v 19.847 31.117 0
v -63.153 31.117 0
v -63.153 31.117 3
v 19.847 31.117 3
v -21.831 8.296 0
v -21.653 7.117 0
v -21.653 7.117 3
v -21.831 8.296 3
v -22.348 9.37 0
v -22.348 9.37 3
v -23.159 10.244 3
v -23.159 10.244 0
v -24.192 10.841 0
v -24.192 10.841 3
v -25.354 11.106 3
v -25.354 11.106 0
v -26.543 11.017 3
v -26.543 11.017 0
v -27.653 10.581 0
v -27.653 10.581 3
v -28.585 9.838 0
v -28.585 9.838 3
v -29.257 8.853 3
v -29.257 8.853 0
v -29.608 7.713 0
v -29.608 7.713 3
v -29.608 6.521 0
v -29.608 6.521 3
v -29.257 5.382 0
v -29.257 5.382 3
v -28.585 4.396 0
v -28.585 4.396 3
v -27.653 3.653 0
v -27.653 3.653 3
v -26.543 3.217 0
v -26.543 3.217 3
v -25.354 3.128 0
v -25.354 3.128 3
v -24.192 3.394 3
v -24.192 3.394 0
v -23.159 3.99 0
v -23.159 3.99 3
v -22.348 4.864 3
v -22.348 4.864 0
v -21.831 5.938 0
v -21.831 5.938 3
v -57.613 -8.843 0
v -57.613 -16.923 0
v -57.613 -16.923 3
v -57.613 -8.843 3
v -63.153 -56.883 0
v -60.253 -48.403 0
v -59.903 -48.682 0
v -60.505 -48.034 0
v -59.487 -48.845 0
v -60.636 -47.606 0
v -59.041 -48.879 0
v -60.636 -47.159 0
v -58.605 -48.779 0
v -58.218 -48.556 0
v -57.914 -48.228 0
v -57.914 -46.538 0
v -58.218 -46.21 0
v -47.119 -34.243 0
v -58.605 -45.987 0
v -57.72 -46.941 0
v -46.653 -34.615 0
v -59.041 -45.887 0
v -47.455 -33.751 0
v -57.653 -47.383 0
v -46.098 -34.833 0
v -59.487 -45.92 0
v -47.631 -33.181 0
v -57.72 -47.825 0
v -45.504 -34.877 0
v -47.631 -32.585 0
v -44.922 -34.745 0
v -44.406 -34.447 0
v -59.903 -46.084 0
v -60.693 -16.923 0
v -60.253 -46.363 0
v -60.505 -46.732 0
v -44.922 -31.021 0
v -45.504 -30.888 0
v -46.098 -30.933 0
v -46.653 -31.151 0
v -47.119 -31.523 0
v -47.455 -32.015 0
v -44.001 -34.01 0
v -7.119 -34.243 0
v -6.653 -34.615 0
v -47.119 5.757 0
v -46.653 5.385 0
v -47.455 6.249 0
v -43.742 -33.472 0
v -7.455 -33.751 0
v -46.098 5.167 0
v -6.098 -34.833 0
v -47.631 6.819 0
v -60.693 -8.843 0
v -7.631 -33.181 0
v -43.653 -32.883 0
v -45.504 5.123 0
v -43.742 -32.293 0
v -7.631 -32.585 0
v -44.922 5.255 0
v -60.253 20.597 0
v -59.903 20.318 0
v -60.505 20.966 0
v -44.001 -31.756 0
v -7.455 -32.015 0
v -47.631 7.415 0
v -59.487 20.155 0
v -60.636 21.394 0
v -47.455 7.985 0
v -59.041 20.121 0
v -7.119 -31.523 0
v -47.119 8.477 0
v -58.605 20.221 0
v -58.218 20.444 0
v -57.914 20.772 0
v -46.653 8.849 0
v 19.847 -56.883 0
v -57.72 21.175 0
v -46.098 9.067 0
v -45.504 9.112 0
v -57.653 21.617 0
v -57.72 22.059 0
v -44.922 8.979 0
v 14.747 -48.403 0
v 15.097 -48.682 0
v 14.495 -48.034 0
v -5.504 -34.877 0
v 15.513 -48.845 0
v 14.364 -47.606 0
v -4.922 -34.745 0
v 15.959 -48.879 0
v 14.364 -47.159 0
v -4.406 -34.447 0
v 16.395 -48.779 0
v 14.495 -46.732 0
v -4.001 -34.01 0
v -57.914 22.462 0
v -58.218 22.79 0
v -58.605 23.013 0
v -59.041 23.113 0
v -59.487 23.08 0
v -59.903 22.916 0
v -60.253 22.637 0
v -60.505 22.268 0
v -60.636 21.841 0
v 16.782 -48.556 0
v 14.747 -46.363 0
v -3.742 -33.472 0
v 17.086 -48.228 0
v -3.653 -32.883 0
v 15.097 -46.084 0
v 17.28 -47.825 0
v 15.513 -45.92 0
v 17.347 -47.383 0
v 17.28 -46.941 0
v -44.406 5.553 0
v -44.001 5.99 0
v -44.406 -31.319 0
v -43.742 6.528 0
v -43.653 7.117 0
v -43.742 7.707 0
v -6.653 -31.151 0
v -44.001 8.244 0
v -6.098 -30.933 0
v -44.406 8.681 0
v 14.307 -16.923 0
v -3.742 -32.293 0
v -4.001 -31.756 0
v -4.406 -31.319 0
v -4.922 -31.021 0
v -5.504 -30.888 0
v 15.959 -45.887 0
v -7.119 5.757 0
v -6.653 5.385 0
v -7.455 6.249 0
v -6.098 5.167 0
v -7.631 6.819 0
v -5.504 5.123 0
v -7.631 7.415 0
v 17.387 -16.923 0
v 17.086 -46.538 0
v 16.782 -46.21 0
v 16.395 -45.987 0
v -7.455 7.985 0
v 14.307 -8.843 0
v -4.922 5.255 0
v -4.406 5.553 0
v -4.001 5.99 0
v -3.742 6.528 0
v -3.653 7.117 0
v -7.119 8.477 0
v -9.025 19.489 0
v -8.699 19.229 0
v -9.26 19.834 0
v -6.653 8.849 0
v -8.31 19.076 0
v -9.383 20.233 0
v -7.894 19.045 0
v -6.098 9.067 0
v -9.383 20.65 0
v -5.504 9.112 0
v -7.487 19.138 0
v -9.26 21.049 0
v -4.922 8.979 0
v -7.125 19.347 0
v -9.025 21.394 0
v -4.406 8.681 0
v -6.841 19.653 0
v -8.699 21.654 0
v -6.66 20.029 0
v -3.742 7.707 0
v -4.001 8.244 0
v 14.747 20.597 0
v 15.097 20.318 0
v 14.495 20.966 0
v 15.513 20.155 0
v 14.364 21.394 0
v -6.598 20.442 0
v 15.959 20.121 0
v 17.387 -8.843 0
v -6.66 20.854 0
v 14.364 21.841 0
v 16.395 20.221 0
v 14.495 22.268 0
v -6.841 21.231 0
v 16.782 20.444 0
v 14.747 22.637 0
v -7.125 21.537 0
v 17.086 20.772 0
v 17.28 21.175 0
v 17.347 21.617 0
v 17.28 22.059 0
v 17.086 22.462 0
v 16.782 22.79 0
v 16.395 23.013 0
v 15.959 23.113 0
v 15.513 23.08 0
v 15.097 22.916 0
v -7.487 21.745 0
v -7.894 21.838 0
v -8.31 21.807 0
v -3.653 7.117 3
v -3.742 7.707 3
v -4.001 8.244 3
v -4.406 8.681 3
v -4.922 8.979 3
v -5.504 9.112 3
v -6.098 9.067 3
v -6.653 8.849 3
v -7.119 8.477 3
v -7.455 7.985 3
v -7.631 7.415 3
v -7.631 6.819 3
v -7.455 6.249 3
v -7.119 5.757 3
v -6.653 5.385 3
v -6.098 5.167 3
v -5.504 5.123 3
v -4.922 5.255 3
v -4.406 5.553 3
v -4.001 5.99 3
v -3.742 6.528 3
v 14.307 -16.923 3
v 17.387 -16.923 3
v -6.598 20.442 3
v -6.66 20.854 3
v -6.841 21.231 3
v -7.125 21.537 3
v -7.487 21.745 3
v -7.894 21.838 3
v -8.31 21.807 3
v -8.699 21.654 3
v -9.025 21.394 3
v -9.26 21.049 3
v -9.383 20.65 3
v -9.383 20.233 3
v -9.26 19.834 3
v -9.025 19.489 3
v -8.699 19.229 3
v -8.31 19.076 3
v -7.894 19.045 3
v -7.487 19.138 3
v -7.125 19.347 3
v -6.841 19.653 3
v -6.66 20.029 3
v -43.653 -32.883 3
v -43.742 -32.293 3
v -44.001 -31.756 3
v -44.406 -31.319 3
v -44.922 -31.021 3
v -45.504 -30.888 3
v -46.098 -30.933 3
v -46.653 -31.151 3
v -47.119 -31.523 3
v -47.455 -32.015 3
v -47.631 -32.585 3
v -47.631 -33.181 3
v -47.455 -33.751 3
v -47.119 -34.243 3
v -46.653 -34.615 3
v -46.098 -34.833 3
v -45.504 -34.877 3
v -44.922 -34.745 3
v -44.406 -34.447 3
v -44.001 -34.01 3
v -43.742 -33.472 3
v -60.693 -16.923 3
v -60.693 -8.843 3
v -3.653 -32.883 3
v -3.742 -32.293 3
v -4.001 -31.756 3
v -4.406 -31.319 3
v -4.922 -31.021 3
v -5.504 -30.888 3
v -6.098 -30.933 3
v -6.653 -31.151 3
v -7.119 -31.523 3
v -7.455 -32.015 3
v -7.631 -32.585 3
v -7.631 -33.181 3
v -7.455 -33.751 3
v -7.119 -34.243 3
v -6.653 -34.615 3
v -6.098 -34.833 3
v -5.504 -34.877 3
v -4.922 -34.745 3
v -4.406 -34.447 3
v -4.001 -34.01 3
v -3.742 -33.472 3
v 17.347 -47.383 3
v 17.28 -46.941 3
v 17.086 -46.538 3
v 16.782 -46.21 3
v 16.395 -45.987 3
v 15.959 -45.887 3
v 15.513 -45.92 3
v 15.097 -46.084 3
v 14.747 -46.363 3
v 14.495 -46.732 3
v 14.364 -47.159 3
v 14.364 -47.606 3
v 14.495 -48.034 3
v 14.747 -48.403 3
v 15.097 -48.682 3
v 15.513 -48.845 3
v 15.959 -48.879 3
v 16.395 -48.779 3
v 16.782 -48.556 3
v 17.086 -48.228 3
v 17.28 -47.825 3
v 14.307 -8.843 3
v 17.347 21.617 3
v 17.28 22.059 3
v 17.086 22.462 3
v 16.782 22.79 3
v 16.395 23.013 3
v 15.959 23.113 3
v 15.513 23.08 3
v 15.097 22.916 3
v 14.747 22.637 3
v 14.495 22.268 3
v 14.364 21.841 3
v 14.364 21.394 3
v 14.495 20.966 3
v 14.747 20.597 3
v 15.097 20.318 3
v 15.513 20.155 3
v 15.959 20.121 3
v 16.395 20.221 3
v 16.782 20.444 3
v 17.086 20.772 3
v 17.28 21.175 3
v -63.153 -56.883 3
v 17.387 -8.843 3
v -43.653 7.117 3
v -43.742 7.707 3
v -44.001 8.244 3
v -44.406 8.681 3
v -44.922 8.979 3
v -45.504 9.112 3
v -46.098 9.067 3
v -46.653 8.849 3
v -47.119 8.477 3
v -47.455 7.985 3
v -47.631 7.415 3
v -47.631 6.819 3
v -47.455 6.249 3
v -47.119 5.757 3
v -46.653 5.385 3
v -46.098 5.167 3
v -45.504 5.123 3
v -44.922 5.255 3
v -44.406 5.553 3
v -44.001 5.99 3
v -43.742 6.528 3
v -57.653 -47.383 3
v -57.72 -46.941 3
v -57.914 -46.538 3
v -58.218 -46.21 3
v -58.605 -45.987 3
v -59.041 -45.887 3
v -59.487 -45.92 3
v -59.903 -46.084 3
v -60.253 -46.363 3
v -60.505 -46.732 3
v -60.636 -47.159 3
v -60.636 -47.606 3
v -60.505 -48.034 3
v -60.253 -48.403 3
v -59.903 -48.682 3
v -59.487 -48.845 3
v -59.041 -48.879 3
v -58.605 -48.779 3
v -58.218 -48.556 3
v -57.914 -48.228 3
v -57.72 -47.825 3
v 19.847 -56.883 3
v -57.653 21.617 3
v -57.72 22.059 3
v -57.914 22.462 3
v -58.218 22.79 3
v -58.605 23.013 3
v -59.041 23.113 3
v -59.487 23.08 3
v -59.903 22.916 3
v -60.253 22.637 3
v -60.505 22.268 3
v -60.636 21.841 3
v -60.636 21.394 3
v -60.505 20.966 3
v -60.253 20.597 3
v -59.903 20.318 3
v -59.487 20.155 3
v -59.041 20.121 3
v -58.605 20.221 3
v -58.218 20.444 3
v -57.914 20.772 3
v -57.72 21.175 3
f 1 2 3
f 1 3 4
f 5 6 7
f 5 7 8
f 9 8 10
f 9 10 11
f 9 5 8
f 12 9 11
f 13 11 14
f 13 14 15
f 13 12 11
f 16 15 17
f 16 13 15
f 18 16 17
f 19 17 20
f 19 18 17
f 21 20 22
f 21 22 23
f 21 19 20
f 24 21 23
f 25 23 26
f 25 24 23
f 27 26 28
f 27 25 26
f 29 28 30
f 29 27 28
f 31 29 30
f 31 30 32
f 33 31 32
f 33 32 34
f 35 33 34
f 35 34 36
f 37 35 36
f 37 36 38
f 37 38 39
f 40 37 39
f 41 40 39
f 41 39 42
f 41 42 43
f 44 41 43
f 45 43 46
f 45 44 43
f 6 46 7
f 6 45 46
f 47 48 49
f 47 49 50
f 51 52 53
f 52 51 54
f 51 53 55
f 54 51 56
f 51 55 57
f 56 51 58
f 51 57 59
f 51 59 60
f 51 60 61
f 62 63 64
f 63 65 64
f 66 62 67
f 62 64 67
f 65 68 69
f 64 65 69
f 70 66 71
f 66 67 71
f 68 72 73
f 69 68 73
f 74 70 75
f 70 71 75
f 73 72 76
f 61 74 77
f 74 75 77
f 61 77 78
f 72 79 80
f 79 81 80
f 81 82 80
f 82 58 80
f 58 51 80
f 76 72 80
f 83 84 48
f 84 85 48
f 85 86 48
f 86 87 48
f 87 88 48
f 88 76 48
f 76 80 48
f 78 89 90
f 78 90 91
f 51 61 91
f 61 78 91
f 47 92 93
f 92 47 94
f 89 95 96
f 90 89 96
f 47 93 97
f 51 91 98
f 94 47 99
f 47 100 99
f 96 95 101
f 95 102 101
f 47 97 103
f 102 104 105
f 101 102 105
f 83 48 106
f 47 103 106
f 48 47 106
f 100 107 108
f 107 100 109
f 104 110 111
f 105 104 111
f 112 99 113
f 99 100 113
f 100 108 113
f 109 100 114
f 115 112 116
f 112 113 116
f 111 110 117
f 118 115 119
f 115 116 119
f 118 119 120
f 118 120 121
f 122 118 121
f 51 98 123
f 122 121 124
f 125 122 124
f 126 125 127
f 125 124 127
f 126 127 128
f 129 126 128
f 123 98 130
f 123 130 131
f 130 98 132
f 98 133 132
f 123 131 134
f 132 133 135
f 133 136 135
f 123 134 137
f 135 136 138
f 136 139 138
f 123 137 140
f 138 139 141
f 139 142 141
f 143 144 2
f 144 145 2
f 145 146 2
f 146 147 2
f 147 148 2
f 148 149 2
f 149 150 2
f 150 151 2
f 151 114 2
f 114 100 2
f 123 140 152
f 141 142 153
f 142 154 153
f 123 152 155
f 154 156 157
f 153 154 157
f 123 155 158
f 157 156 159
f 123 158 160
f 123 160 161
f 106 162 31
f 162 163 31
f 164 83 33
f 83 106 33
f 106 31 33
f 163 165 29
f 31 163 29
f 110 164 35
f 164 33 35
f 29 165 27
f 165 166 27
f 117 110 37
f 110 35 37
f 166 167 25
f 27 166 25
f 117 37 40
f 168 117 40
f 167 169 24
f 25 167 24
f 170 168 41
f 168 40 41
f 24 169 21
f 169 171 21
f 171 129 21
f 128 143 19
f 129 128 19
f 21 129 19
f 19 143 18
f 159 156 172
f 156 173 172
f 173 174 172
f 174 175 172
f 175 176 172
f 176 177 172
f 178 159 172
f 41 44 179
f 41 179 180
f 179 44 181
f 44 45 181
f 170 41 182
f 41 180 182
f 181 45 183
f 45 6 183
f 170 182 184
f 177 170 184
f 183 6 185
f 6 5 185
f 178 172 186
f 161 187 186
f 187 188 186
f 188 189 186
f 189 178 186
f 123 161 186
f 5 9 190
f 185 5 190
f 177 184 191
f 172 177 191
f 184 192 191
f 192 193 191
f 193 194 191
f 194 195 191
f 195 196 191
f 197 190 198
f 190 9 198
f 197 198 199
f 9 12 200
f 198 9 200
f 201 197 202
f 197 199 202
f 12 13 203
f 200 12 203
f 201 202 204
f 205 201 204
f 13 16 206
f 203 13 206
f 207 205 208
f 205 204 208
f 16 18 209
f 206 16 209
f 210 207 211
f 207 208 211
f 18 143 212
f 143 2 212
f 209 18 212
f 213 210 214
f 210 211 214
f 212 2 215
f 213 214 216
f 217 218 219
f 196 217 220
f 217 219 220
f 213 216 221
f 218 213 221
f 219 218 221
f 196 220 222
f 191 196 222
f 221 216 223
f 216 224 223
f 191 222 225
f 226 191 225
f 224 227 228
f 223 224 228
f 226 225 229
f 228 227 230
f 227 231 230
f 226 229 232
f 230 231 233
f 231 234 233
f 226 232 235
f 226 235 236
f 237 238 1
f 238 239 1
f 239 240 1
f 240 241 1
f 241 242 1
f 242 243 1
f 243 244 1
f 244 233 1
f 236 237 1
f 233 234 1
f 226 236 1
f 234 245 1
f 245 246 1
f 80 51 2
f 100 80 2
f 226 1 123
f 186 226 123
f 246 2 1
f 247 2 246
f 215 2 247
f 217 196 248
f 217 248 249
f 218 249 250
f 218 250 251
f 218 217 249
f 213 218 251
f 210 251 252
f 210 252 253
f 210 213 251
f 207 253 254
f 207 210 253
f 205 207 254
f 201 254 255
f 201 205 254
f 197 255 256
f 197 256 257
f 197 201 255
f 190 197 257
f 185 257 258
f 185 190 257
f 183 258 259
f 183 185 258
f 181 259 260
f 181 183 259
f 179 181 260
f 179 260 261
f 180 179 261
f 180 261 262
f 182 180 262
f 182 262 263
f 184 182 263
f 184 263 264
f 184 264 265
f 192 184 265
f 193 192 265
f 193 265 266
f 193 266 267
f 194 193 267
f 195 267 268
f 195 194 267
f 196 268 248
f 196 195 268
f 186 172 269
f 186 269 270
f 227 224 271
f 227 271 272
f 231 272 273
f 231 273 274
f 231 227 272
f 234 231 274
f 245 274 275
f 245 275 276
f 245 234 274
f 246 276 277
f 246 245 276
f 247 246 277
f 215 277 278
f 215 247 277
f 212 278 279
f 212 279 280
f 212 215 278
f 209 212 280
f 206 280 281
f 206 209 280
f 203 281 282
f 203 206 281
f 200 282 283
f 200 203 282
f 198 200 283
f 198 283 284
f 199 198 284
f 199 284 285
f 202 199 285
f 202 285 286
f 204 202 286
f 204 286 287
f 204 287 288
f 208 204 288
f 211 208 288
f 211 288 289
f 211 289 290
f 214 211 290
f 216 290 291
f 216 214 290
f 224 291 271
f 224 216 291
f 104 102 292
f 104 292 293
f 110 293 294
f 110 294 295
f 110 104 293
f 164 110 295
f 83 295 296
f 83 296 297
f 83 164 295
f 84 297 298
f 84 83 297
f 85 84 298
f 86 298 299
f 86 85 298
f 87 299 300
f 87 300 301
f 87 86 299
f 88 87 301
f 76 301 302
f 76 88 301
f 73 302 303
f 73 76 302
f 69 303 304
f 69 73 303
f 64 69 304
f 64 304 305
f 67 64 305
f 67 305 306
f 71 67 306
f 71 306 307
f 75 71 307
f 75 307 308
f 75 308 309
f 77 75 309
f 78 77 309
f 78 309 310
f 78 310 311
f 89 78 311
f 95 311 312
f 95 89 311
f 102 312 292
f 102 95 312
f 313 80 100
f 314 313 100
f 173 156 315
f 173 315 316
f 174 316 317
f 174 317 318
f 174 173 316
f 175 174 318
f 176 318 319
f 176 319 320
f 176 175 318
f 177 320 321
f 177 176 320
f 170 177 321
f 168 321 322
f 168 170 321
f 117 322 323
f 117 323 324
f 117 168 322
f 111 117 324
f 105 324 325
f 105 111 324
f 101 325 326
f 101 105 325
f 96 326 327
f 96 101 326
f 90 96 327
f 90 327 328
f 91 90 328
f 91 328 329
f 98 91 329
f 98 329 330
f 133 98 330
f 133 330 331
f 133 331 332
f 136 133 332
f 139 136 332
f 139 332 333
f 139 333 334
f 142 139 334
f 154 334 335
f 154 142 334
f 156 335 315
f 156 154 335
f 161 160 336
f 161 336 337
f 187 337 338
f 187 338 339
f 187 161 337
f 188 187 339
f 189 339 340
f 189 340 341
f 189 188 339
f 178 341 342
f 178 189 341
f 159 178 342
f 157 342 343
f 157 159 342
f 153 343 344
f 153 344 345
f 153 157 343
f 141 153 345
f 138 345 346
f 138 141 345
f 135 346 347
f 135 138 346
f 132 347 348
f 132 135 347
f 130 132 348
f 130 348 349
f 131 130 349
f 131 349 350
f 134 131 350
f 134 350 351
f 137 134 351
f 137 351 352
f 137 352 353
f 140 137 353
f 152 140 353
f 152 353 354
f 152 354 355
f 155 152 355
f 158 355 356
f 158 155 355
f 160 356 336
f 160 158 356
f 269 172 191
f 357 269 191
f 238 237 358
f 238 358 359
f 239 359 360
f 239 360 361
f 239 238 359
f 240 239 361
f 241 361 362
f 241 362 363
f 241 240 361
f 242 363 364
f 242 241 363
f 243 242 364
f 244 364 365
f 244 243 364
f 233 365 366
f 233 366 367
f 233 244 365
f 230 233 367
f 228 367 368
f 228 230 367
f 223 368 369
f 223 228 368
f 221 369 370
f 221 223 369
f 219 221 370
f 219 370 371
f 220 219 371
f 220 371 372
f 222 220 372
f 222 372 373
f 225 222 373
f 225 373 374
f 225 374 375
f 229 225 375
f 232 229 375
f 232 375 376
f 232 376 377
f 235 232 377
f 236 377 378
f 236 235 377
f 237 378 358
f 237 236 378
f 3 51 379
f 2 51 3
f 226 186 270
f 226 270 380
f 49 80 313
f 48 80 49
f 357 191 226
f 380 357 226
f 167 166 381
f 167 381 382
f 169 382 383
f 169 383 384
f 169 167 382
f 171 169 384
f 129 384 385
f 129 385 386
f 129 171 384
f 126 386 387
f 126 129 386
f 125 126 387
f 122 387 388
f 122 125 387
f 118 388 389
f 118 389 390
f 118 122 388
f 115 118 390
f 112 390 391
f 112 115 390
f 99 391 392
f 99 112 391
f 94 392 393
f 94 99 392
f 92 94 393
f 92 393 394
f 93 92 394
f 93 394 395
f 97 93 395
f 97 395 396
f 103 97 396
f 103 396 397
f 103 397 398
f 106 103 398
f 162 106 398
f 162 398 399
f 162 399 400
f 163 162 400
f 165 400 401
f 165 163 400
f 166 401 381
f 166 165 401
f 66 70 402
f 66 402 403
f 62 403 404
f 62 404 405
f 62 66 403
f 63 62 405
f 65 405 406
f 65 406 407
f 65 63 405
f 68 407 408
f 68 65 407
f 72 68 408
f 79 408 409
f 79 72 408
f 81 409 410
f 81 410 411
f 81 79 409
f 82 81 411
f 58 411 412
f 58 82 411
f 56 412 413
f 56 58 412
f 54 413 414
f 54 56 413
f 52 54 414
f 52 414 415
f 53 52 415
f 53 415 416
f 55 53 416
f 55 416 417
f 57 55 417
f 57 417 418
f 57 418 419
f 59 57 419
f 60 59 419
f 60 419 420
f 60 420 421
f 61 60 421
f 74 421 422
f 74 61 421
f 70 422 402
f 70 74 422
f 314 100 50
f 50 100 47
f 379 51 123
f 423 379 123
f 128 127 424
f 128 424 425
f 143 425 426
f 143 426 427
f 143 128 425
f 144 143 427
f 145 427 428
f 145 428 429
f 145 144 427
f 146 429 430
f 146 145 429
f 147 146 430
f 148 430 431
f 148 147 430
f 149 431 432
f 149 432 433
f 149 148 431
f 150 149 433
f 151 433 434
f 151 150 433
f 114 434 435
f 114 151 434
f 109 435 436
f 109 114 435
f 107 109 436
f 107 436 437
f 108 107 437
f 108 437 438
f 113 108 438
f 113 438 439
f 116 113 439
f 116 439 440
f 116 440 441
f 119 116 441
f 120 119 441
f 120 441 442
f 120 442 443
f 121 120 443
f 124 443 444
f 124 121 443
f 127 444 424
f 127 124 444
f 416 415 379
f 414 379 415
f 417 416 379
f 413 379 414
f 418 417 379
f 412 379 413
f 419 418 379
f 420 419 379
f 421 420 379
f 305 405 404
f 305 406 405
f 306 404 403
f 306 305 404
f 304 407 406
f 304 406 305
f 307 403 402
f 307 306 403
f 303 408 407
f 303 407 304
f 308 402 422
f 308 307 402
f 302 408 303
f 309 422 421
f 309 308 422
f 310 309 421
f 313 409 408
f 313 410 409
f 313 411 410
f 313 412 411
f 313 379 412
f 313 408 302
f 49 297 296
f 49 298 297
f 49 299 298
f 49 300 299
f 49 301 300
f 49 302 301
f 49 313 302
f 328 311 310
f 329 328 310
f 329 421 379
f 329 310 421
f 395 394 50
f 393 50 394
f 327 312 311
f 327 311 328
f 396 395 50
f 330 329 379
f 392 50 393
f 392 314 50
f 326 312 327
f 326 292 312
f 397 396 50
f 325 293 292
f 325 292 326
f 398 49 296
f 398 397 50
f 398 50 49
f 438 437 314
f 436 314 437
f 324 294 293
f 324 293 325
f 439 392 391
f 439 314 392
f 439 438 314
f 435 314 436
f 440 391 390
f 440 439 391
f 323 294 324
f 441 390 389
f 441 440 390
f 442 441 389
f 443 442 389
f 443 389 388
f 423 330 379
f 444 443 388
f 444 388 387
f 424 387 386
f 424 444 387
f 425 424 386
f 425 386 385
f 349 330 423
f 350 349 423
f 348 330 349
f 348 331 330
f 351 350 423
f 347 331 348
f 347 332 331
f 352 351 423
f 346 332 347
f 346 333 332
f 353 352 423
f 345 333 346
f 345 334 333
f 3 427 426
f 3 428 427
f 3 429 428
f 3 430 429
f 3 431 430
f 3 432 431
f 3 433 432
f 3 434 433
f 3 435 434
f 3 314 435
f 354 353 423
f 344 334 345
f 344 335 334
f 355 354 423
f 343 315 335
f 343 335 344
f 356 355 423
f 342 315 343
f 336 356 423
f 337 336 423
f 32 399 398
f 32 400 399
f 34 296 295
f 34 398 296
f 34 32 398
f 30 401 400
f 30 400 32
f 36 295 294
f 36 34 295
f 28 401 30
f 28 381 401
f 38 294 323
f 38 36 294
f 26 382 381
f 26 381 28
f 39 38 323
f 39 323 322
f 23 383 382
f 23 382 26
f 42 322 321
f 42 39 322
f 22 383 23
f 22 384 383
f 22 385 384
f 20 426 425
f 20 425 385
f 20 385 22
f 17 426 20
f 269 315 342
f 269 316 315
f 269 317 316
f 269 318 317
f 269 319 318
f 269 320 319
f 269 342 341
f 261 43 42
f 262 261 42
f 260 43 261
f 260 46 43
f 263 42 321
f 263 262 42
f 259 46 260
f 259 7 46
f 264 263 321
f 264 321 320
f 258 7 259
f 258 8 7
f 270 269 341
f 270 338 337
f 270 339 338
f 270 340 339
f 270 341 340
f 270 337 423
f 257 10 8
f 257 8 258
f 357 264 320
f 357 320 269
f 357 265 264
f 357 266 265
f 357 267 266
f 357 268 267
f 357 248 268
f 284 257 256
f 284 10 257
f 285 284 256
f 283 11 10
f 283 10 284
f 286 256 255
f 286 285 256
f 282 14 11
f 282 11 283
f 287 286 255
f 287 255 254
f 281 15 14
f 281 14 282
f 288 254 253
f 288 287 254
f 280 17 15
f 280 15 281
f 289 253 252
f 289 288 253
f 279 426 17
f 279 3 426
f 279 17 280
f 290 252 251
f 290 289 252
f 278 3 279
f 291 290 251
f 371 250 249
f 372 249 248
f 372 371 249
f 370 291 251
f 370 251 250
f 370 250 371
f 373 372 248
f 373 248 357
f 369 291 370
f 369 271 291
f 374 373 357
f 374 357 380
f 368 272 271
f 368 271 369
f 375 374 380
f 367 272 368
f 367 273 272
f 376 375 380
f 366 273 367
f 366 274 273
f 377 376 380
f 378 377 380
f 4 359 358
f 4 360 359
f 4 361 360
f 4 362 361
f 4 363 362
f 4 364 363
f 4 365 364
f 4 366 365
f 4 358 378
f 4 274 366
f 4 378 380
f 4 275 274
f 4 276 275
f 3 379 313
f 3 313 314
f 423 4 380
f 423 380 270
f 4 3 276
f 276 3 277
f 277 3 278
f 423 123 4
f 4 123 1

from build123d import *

# Parameters (mm, degrees)
SKETCH_1_W      = 83
SKETCH_1_H      = 88
SKETCH_1_R      = 1.5
SKETCH_1_R_2    = 2
SKETCH_1_R_3    = 4
SKETCH_1_R_4    = 1.400374755
SKETCH_1_W_2    = 3.08
SKETCH_1_H_2    = 8.08
EXTRUDE_1_DEPTH = 3


with BuildPart() as part:
    # 草图1 → 凸台-拉伸1 (new body)
    with BuildSketch(Plane.XY):
        with Locations((-21.653153153, -12.882882883)):
            Rectangle(SKETCH_1_W, SKETCH_1_H)
        with Locations((-59.153153153, 21.617117117)):
            Circle(SKETCH_1_R, mode=Mode.SUBTRACT)
        with Locations((15.846846847, 21.617117117)):
            Circle(SKETCH_1_R, mode=Mode.SUBTRACT)
        with Locations((-59.153153153, -47.382882883)):
            Circle(SKETCH_1_R, mode=Mode.SUBTRACT)
        with Locations((15.846846847, -47.382882883)):
            Circle(SKETCH_1_R, mode=Mode.SUBTRACT)
        with Locations((-5.653153153, -32.882882883)):
            Circle(SKETCH_1_R_2, mode=Mode.SUBTRACT)
        with Locations((-45.653153153, -32.882882883)):
            Circle(SKETCH_1_R_2, mode=Mode.SUBTRACT)
        with Locations((-45.653153153, 7.117117117)):
            Circle(SKETCH_1_R_2, mode=Mode.SUBTRACT)
        with Locations((-5.653153153, 7.117117117)):
            Circle(SKETCH_1_R_2, mode=Mode.SUBTRACT)
        with Locations((-25.653153153, 7.117117117)):
            Circle(SKETCH_1_R_3, mode=Mode.SUBTRACT)
        with Locations((-7.998369036, 20.441702668)):
            Circle(SKETCH_1_R_4, mode=Mode.SUBTRACT)
        with Locations((-59.153153153, -12.882882883)):
            Rectangle(SKETCH_1_W_2, SKETCH_1_H_2, mode=Mode.SUBTRACT)
        with Locations((15.846846847, -12.882882883)):
            Rectangle(SKETCH_1_W_2, SKETCH_1_H_2, mode=Mode.SUBTRACT)
    extrude(amount=EXTRUDE_1_DEPTH)


solid = part.part
